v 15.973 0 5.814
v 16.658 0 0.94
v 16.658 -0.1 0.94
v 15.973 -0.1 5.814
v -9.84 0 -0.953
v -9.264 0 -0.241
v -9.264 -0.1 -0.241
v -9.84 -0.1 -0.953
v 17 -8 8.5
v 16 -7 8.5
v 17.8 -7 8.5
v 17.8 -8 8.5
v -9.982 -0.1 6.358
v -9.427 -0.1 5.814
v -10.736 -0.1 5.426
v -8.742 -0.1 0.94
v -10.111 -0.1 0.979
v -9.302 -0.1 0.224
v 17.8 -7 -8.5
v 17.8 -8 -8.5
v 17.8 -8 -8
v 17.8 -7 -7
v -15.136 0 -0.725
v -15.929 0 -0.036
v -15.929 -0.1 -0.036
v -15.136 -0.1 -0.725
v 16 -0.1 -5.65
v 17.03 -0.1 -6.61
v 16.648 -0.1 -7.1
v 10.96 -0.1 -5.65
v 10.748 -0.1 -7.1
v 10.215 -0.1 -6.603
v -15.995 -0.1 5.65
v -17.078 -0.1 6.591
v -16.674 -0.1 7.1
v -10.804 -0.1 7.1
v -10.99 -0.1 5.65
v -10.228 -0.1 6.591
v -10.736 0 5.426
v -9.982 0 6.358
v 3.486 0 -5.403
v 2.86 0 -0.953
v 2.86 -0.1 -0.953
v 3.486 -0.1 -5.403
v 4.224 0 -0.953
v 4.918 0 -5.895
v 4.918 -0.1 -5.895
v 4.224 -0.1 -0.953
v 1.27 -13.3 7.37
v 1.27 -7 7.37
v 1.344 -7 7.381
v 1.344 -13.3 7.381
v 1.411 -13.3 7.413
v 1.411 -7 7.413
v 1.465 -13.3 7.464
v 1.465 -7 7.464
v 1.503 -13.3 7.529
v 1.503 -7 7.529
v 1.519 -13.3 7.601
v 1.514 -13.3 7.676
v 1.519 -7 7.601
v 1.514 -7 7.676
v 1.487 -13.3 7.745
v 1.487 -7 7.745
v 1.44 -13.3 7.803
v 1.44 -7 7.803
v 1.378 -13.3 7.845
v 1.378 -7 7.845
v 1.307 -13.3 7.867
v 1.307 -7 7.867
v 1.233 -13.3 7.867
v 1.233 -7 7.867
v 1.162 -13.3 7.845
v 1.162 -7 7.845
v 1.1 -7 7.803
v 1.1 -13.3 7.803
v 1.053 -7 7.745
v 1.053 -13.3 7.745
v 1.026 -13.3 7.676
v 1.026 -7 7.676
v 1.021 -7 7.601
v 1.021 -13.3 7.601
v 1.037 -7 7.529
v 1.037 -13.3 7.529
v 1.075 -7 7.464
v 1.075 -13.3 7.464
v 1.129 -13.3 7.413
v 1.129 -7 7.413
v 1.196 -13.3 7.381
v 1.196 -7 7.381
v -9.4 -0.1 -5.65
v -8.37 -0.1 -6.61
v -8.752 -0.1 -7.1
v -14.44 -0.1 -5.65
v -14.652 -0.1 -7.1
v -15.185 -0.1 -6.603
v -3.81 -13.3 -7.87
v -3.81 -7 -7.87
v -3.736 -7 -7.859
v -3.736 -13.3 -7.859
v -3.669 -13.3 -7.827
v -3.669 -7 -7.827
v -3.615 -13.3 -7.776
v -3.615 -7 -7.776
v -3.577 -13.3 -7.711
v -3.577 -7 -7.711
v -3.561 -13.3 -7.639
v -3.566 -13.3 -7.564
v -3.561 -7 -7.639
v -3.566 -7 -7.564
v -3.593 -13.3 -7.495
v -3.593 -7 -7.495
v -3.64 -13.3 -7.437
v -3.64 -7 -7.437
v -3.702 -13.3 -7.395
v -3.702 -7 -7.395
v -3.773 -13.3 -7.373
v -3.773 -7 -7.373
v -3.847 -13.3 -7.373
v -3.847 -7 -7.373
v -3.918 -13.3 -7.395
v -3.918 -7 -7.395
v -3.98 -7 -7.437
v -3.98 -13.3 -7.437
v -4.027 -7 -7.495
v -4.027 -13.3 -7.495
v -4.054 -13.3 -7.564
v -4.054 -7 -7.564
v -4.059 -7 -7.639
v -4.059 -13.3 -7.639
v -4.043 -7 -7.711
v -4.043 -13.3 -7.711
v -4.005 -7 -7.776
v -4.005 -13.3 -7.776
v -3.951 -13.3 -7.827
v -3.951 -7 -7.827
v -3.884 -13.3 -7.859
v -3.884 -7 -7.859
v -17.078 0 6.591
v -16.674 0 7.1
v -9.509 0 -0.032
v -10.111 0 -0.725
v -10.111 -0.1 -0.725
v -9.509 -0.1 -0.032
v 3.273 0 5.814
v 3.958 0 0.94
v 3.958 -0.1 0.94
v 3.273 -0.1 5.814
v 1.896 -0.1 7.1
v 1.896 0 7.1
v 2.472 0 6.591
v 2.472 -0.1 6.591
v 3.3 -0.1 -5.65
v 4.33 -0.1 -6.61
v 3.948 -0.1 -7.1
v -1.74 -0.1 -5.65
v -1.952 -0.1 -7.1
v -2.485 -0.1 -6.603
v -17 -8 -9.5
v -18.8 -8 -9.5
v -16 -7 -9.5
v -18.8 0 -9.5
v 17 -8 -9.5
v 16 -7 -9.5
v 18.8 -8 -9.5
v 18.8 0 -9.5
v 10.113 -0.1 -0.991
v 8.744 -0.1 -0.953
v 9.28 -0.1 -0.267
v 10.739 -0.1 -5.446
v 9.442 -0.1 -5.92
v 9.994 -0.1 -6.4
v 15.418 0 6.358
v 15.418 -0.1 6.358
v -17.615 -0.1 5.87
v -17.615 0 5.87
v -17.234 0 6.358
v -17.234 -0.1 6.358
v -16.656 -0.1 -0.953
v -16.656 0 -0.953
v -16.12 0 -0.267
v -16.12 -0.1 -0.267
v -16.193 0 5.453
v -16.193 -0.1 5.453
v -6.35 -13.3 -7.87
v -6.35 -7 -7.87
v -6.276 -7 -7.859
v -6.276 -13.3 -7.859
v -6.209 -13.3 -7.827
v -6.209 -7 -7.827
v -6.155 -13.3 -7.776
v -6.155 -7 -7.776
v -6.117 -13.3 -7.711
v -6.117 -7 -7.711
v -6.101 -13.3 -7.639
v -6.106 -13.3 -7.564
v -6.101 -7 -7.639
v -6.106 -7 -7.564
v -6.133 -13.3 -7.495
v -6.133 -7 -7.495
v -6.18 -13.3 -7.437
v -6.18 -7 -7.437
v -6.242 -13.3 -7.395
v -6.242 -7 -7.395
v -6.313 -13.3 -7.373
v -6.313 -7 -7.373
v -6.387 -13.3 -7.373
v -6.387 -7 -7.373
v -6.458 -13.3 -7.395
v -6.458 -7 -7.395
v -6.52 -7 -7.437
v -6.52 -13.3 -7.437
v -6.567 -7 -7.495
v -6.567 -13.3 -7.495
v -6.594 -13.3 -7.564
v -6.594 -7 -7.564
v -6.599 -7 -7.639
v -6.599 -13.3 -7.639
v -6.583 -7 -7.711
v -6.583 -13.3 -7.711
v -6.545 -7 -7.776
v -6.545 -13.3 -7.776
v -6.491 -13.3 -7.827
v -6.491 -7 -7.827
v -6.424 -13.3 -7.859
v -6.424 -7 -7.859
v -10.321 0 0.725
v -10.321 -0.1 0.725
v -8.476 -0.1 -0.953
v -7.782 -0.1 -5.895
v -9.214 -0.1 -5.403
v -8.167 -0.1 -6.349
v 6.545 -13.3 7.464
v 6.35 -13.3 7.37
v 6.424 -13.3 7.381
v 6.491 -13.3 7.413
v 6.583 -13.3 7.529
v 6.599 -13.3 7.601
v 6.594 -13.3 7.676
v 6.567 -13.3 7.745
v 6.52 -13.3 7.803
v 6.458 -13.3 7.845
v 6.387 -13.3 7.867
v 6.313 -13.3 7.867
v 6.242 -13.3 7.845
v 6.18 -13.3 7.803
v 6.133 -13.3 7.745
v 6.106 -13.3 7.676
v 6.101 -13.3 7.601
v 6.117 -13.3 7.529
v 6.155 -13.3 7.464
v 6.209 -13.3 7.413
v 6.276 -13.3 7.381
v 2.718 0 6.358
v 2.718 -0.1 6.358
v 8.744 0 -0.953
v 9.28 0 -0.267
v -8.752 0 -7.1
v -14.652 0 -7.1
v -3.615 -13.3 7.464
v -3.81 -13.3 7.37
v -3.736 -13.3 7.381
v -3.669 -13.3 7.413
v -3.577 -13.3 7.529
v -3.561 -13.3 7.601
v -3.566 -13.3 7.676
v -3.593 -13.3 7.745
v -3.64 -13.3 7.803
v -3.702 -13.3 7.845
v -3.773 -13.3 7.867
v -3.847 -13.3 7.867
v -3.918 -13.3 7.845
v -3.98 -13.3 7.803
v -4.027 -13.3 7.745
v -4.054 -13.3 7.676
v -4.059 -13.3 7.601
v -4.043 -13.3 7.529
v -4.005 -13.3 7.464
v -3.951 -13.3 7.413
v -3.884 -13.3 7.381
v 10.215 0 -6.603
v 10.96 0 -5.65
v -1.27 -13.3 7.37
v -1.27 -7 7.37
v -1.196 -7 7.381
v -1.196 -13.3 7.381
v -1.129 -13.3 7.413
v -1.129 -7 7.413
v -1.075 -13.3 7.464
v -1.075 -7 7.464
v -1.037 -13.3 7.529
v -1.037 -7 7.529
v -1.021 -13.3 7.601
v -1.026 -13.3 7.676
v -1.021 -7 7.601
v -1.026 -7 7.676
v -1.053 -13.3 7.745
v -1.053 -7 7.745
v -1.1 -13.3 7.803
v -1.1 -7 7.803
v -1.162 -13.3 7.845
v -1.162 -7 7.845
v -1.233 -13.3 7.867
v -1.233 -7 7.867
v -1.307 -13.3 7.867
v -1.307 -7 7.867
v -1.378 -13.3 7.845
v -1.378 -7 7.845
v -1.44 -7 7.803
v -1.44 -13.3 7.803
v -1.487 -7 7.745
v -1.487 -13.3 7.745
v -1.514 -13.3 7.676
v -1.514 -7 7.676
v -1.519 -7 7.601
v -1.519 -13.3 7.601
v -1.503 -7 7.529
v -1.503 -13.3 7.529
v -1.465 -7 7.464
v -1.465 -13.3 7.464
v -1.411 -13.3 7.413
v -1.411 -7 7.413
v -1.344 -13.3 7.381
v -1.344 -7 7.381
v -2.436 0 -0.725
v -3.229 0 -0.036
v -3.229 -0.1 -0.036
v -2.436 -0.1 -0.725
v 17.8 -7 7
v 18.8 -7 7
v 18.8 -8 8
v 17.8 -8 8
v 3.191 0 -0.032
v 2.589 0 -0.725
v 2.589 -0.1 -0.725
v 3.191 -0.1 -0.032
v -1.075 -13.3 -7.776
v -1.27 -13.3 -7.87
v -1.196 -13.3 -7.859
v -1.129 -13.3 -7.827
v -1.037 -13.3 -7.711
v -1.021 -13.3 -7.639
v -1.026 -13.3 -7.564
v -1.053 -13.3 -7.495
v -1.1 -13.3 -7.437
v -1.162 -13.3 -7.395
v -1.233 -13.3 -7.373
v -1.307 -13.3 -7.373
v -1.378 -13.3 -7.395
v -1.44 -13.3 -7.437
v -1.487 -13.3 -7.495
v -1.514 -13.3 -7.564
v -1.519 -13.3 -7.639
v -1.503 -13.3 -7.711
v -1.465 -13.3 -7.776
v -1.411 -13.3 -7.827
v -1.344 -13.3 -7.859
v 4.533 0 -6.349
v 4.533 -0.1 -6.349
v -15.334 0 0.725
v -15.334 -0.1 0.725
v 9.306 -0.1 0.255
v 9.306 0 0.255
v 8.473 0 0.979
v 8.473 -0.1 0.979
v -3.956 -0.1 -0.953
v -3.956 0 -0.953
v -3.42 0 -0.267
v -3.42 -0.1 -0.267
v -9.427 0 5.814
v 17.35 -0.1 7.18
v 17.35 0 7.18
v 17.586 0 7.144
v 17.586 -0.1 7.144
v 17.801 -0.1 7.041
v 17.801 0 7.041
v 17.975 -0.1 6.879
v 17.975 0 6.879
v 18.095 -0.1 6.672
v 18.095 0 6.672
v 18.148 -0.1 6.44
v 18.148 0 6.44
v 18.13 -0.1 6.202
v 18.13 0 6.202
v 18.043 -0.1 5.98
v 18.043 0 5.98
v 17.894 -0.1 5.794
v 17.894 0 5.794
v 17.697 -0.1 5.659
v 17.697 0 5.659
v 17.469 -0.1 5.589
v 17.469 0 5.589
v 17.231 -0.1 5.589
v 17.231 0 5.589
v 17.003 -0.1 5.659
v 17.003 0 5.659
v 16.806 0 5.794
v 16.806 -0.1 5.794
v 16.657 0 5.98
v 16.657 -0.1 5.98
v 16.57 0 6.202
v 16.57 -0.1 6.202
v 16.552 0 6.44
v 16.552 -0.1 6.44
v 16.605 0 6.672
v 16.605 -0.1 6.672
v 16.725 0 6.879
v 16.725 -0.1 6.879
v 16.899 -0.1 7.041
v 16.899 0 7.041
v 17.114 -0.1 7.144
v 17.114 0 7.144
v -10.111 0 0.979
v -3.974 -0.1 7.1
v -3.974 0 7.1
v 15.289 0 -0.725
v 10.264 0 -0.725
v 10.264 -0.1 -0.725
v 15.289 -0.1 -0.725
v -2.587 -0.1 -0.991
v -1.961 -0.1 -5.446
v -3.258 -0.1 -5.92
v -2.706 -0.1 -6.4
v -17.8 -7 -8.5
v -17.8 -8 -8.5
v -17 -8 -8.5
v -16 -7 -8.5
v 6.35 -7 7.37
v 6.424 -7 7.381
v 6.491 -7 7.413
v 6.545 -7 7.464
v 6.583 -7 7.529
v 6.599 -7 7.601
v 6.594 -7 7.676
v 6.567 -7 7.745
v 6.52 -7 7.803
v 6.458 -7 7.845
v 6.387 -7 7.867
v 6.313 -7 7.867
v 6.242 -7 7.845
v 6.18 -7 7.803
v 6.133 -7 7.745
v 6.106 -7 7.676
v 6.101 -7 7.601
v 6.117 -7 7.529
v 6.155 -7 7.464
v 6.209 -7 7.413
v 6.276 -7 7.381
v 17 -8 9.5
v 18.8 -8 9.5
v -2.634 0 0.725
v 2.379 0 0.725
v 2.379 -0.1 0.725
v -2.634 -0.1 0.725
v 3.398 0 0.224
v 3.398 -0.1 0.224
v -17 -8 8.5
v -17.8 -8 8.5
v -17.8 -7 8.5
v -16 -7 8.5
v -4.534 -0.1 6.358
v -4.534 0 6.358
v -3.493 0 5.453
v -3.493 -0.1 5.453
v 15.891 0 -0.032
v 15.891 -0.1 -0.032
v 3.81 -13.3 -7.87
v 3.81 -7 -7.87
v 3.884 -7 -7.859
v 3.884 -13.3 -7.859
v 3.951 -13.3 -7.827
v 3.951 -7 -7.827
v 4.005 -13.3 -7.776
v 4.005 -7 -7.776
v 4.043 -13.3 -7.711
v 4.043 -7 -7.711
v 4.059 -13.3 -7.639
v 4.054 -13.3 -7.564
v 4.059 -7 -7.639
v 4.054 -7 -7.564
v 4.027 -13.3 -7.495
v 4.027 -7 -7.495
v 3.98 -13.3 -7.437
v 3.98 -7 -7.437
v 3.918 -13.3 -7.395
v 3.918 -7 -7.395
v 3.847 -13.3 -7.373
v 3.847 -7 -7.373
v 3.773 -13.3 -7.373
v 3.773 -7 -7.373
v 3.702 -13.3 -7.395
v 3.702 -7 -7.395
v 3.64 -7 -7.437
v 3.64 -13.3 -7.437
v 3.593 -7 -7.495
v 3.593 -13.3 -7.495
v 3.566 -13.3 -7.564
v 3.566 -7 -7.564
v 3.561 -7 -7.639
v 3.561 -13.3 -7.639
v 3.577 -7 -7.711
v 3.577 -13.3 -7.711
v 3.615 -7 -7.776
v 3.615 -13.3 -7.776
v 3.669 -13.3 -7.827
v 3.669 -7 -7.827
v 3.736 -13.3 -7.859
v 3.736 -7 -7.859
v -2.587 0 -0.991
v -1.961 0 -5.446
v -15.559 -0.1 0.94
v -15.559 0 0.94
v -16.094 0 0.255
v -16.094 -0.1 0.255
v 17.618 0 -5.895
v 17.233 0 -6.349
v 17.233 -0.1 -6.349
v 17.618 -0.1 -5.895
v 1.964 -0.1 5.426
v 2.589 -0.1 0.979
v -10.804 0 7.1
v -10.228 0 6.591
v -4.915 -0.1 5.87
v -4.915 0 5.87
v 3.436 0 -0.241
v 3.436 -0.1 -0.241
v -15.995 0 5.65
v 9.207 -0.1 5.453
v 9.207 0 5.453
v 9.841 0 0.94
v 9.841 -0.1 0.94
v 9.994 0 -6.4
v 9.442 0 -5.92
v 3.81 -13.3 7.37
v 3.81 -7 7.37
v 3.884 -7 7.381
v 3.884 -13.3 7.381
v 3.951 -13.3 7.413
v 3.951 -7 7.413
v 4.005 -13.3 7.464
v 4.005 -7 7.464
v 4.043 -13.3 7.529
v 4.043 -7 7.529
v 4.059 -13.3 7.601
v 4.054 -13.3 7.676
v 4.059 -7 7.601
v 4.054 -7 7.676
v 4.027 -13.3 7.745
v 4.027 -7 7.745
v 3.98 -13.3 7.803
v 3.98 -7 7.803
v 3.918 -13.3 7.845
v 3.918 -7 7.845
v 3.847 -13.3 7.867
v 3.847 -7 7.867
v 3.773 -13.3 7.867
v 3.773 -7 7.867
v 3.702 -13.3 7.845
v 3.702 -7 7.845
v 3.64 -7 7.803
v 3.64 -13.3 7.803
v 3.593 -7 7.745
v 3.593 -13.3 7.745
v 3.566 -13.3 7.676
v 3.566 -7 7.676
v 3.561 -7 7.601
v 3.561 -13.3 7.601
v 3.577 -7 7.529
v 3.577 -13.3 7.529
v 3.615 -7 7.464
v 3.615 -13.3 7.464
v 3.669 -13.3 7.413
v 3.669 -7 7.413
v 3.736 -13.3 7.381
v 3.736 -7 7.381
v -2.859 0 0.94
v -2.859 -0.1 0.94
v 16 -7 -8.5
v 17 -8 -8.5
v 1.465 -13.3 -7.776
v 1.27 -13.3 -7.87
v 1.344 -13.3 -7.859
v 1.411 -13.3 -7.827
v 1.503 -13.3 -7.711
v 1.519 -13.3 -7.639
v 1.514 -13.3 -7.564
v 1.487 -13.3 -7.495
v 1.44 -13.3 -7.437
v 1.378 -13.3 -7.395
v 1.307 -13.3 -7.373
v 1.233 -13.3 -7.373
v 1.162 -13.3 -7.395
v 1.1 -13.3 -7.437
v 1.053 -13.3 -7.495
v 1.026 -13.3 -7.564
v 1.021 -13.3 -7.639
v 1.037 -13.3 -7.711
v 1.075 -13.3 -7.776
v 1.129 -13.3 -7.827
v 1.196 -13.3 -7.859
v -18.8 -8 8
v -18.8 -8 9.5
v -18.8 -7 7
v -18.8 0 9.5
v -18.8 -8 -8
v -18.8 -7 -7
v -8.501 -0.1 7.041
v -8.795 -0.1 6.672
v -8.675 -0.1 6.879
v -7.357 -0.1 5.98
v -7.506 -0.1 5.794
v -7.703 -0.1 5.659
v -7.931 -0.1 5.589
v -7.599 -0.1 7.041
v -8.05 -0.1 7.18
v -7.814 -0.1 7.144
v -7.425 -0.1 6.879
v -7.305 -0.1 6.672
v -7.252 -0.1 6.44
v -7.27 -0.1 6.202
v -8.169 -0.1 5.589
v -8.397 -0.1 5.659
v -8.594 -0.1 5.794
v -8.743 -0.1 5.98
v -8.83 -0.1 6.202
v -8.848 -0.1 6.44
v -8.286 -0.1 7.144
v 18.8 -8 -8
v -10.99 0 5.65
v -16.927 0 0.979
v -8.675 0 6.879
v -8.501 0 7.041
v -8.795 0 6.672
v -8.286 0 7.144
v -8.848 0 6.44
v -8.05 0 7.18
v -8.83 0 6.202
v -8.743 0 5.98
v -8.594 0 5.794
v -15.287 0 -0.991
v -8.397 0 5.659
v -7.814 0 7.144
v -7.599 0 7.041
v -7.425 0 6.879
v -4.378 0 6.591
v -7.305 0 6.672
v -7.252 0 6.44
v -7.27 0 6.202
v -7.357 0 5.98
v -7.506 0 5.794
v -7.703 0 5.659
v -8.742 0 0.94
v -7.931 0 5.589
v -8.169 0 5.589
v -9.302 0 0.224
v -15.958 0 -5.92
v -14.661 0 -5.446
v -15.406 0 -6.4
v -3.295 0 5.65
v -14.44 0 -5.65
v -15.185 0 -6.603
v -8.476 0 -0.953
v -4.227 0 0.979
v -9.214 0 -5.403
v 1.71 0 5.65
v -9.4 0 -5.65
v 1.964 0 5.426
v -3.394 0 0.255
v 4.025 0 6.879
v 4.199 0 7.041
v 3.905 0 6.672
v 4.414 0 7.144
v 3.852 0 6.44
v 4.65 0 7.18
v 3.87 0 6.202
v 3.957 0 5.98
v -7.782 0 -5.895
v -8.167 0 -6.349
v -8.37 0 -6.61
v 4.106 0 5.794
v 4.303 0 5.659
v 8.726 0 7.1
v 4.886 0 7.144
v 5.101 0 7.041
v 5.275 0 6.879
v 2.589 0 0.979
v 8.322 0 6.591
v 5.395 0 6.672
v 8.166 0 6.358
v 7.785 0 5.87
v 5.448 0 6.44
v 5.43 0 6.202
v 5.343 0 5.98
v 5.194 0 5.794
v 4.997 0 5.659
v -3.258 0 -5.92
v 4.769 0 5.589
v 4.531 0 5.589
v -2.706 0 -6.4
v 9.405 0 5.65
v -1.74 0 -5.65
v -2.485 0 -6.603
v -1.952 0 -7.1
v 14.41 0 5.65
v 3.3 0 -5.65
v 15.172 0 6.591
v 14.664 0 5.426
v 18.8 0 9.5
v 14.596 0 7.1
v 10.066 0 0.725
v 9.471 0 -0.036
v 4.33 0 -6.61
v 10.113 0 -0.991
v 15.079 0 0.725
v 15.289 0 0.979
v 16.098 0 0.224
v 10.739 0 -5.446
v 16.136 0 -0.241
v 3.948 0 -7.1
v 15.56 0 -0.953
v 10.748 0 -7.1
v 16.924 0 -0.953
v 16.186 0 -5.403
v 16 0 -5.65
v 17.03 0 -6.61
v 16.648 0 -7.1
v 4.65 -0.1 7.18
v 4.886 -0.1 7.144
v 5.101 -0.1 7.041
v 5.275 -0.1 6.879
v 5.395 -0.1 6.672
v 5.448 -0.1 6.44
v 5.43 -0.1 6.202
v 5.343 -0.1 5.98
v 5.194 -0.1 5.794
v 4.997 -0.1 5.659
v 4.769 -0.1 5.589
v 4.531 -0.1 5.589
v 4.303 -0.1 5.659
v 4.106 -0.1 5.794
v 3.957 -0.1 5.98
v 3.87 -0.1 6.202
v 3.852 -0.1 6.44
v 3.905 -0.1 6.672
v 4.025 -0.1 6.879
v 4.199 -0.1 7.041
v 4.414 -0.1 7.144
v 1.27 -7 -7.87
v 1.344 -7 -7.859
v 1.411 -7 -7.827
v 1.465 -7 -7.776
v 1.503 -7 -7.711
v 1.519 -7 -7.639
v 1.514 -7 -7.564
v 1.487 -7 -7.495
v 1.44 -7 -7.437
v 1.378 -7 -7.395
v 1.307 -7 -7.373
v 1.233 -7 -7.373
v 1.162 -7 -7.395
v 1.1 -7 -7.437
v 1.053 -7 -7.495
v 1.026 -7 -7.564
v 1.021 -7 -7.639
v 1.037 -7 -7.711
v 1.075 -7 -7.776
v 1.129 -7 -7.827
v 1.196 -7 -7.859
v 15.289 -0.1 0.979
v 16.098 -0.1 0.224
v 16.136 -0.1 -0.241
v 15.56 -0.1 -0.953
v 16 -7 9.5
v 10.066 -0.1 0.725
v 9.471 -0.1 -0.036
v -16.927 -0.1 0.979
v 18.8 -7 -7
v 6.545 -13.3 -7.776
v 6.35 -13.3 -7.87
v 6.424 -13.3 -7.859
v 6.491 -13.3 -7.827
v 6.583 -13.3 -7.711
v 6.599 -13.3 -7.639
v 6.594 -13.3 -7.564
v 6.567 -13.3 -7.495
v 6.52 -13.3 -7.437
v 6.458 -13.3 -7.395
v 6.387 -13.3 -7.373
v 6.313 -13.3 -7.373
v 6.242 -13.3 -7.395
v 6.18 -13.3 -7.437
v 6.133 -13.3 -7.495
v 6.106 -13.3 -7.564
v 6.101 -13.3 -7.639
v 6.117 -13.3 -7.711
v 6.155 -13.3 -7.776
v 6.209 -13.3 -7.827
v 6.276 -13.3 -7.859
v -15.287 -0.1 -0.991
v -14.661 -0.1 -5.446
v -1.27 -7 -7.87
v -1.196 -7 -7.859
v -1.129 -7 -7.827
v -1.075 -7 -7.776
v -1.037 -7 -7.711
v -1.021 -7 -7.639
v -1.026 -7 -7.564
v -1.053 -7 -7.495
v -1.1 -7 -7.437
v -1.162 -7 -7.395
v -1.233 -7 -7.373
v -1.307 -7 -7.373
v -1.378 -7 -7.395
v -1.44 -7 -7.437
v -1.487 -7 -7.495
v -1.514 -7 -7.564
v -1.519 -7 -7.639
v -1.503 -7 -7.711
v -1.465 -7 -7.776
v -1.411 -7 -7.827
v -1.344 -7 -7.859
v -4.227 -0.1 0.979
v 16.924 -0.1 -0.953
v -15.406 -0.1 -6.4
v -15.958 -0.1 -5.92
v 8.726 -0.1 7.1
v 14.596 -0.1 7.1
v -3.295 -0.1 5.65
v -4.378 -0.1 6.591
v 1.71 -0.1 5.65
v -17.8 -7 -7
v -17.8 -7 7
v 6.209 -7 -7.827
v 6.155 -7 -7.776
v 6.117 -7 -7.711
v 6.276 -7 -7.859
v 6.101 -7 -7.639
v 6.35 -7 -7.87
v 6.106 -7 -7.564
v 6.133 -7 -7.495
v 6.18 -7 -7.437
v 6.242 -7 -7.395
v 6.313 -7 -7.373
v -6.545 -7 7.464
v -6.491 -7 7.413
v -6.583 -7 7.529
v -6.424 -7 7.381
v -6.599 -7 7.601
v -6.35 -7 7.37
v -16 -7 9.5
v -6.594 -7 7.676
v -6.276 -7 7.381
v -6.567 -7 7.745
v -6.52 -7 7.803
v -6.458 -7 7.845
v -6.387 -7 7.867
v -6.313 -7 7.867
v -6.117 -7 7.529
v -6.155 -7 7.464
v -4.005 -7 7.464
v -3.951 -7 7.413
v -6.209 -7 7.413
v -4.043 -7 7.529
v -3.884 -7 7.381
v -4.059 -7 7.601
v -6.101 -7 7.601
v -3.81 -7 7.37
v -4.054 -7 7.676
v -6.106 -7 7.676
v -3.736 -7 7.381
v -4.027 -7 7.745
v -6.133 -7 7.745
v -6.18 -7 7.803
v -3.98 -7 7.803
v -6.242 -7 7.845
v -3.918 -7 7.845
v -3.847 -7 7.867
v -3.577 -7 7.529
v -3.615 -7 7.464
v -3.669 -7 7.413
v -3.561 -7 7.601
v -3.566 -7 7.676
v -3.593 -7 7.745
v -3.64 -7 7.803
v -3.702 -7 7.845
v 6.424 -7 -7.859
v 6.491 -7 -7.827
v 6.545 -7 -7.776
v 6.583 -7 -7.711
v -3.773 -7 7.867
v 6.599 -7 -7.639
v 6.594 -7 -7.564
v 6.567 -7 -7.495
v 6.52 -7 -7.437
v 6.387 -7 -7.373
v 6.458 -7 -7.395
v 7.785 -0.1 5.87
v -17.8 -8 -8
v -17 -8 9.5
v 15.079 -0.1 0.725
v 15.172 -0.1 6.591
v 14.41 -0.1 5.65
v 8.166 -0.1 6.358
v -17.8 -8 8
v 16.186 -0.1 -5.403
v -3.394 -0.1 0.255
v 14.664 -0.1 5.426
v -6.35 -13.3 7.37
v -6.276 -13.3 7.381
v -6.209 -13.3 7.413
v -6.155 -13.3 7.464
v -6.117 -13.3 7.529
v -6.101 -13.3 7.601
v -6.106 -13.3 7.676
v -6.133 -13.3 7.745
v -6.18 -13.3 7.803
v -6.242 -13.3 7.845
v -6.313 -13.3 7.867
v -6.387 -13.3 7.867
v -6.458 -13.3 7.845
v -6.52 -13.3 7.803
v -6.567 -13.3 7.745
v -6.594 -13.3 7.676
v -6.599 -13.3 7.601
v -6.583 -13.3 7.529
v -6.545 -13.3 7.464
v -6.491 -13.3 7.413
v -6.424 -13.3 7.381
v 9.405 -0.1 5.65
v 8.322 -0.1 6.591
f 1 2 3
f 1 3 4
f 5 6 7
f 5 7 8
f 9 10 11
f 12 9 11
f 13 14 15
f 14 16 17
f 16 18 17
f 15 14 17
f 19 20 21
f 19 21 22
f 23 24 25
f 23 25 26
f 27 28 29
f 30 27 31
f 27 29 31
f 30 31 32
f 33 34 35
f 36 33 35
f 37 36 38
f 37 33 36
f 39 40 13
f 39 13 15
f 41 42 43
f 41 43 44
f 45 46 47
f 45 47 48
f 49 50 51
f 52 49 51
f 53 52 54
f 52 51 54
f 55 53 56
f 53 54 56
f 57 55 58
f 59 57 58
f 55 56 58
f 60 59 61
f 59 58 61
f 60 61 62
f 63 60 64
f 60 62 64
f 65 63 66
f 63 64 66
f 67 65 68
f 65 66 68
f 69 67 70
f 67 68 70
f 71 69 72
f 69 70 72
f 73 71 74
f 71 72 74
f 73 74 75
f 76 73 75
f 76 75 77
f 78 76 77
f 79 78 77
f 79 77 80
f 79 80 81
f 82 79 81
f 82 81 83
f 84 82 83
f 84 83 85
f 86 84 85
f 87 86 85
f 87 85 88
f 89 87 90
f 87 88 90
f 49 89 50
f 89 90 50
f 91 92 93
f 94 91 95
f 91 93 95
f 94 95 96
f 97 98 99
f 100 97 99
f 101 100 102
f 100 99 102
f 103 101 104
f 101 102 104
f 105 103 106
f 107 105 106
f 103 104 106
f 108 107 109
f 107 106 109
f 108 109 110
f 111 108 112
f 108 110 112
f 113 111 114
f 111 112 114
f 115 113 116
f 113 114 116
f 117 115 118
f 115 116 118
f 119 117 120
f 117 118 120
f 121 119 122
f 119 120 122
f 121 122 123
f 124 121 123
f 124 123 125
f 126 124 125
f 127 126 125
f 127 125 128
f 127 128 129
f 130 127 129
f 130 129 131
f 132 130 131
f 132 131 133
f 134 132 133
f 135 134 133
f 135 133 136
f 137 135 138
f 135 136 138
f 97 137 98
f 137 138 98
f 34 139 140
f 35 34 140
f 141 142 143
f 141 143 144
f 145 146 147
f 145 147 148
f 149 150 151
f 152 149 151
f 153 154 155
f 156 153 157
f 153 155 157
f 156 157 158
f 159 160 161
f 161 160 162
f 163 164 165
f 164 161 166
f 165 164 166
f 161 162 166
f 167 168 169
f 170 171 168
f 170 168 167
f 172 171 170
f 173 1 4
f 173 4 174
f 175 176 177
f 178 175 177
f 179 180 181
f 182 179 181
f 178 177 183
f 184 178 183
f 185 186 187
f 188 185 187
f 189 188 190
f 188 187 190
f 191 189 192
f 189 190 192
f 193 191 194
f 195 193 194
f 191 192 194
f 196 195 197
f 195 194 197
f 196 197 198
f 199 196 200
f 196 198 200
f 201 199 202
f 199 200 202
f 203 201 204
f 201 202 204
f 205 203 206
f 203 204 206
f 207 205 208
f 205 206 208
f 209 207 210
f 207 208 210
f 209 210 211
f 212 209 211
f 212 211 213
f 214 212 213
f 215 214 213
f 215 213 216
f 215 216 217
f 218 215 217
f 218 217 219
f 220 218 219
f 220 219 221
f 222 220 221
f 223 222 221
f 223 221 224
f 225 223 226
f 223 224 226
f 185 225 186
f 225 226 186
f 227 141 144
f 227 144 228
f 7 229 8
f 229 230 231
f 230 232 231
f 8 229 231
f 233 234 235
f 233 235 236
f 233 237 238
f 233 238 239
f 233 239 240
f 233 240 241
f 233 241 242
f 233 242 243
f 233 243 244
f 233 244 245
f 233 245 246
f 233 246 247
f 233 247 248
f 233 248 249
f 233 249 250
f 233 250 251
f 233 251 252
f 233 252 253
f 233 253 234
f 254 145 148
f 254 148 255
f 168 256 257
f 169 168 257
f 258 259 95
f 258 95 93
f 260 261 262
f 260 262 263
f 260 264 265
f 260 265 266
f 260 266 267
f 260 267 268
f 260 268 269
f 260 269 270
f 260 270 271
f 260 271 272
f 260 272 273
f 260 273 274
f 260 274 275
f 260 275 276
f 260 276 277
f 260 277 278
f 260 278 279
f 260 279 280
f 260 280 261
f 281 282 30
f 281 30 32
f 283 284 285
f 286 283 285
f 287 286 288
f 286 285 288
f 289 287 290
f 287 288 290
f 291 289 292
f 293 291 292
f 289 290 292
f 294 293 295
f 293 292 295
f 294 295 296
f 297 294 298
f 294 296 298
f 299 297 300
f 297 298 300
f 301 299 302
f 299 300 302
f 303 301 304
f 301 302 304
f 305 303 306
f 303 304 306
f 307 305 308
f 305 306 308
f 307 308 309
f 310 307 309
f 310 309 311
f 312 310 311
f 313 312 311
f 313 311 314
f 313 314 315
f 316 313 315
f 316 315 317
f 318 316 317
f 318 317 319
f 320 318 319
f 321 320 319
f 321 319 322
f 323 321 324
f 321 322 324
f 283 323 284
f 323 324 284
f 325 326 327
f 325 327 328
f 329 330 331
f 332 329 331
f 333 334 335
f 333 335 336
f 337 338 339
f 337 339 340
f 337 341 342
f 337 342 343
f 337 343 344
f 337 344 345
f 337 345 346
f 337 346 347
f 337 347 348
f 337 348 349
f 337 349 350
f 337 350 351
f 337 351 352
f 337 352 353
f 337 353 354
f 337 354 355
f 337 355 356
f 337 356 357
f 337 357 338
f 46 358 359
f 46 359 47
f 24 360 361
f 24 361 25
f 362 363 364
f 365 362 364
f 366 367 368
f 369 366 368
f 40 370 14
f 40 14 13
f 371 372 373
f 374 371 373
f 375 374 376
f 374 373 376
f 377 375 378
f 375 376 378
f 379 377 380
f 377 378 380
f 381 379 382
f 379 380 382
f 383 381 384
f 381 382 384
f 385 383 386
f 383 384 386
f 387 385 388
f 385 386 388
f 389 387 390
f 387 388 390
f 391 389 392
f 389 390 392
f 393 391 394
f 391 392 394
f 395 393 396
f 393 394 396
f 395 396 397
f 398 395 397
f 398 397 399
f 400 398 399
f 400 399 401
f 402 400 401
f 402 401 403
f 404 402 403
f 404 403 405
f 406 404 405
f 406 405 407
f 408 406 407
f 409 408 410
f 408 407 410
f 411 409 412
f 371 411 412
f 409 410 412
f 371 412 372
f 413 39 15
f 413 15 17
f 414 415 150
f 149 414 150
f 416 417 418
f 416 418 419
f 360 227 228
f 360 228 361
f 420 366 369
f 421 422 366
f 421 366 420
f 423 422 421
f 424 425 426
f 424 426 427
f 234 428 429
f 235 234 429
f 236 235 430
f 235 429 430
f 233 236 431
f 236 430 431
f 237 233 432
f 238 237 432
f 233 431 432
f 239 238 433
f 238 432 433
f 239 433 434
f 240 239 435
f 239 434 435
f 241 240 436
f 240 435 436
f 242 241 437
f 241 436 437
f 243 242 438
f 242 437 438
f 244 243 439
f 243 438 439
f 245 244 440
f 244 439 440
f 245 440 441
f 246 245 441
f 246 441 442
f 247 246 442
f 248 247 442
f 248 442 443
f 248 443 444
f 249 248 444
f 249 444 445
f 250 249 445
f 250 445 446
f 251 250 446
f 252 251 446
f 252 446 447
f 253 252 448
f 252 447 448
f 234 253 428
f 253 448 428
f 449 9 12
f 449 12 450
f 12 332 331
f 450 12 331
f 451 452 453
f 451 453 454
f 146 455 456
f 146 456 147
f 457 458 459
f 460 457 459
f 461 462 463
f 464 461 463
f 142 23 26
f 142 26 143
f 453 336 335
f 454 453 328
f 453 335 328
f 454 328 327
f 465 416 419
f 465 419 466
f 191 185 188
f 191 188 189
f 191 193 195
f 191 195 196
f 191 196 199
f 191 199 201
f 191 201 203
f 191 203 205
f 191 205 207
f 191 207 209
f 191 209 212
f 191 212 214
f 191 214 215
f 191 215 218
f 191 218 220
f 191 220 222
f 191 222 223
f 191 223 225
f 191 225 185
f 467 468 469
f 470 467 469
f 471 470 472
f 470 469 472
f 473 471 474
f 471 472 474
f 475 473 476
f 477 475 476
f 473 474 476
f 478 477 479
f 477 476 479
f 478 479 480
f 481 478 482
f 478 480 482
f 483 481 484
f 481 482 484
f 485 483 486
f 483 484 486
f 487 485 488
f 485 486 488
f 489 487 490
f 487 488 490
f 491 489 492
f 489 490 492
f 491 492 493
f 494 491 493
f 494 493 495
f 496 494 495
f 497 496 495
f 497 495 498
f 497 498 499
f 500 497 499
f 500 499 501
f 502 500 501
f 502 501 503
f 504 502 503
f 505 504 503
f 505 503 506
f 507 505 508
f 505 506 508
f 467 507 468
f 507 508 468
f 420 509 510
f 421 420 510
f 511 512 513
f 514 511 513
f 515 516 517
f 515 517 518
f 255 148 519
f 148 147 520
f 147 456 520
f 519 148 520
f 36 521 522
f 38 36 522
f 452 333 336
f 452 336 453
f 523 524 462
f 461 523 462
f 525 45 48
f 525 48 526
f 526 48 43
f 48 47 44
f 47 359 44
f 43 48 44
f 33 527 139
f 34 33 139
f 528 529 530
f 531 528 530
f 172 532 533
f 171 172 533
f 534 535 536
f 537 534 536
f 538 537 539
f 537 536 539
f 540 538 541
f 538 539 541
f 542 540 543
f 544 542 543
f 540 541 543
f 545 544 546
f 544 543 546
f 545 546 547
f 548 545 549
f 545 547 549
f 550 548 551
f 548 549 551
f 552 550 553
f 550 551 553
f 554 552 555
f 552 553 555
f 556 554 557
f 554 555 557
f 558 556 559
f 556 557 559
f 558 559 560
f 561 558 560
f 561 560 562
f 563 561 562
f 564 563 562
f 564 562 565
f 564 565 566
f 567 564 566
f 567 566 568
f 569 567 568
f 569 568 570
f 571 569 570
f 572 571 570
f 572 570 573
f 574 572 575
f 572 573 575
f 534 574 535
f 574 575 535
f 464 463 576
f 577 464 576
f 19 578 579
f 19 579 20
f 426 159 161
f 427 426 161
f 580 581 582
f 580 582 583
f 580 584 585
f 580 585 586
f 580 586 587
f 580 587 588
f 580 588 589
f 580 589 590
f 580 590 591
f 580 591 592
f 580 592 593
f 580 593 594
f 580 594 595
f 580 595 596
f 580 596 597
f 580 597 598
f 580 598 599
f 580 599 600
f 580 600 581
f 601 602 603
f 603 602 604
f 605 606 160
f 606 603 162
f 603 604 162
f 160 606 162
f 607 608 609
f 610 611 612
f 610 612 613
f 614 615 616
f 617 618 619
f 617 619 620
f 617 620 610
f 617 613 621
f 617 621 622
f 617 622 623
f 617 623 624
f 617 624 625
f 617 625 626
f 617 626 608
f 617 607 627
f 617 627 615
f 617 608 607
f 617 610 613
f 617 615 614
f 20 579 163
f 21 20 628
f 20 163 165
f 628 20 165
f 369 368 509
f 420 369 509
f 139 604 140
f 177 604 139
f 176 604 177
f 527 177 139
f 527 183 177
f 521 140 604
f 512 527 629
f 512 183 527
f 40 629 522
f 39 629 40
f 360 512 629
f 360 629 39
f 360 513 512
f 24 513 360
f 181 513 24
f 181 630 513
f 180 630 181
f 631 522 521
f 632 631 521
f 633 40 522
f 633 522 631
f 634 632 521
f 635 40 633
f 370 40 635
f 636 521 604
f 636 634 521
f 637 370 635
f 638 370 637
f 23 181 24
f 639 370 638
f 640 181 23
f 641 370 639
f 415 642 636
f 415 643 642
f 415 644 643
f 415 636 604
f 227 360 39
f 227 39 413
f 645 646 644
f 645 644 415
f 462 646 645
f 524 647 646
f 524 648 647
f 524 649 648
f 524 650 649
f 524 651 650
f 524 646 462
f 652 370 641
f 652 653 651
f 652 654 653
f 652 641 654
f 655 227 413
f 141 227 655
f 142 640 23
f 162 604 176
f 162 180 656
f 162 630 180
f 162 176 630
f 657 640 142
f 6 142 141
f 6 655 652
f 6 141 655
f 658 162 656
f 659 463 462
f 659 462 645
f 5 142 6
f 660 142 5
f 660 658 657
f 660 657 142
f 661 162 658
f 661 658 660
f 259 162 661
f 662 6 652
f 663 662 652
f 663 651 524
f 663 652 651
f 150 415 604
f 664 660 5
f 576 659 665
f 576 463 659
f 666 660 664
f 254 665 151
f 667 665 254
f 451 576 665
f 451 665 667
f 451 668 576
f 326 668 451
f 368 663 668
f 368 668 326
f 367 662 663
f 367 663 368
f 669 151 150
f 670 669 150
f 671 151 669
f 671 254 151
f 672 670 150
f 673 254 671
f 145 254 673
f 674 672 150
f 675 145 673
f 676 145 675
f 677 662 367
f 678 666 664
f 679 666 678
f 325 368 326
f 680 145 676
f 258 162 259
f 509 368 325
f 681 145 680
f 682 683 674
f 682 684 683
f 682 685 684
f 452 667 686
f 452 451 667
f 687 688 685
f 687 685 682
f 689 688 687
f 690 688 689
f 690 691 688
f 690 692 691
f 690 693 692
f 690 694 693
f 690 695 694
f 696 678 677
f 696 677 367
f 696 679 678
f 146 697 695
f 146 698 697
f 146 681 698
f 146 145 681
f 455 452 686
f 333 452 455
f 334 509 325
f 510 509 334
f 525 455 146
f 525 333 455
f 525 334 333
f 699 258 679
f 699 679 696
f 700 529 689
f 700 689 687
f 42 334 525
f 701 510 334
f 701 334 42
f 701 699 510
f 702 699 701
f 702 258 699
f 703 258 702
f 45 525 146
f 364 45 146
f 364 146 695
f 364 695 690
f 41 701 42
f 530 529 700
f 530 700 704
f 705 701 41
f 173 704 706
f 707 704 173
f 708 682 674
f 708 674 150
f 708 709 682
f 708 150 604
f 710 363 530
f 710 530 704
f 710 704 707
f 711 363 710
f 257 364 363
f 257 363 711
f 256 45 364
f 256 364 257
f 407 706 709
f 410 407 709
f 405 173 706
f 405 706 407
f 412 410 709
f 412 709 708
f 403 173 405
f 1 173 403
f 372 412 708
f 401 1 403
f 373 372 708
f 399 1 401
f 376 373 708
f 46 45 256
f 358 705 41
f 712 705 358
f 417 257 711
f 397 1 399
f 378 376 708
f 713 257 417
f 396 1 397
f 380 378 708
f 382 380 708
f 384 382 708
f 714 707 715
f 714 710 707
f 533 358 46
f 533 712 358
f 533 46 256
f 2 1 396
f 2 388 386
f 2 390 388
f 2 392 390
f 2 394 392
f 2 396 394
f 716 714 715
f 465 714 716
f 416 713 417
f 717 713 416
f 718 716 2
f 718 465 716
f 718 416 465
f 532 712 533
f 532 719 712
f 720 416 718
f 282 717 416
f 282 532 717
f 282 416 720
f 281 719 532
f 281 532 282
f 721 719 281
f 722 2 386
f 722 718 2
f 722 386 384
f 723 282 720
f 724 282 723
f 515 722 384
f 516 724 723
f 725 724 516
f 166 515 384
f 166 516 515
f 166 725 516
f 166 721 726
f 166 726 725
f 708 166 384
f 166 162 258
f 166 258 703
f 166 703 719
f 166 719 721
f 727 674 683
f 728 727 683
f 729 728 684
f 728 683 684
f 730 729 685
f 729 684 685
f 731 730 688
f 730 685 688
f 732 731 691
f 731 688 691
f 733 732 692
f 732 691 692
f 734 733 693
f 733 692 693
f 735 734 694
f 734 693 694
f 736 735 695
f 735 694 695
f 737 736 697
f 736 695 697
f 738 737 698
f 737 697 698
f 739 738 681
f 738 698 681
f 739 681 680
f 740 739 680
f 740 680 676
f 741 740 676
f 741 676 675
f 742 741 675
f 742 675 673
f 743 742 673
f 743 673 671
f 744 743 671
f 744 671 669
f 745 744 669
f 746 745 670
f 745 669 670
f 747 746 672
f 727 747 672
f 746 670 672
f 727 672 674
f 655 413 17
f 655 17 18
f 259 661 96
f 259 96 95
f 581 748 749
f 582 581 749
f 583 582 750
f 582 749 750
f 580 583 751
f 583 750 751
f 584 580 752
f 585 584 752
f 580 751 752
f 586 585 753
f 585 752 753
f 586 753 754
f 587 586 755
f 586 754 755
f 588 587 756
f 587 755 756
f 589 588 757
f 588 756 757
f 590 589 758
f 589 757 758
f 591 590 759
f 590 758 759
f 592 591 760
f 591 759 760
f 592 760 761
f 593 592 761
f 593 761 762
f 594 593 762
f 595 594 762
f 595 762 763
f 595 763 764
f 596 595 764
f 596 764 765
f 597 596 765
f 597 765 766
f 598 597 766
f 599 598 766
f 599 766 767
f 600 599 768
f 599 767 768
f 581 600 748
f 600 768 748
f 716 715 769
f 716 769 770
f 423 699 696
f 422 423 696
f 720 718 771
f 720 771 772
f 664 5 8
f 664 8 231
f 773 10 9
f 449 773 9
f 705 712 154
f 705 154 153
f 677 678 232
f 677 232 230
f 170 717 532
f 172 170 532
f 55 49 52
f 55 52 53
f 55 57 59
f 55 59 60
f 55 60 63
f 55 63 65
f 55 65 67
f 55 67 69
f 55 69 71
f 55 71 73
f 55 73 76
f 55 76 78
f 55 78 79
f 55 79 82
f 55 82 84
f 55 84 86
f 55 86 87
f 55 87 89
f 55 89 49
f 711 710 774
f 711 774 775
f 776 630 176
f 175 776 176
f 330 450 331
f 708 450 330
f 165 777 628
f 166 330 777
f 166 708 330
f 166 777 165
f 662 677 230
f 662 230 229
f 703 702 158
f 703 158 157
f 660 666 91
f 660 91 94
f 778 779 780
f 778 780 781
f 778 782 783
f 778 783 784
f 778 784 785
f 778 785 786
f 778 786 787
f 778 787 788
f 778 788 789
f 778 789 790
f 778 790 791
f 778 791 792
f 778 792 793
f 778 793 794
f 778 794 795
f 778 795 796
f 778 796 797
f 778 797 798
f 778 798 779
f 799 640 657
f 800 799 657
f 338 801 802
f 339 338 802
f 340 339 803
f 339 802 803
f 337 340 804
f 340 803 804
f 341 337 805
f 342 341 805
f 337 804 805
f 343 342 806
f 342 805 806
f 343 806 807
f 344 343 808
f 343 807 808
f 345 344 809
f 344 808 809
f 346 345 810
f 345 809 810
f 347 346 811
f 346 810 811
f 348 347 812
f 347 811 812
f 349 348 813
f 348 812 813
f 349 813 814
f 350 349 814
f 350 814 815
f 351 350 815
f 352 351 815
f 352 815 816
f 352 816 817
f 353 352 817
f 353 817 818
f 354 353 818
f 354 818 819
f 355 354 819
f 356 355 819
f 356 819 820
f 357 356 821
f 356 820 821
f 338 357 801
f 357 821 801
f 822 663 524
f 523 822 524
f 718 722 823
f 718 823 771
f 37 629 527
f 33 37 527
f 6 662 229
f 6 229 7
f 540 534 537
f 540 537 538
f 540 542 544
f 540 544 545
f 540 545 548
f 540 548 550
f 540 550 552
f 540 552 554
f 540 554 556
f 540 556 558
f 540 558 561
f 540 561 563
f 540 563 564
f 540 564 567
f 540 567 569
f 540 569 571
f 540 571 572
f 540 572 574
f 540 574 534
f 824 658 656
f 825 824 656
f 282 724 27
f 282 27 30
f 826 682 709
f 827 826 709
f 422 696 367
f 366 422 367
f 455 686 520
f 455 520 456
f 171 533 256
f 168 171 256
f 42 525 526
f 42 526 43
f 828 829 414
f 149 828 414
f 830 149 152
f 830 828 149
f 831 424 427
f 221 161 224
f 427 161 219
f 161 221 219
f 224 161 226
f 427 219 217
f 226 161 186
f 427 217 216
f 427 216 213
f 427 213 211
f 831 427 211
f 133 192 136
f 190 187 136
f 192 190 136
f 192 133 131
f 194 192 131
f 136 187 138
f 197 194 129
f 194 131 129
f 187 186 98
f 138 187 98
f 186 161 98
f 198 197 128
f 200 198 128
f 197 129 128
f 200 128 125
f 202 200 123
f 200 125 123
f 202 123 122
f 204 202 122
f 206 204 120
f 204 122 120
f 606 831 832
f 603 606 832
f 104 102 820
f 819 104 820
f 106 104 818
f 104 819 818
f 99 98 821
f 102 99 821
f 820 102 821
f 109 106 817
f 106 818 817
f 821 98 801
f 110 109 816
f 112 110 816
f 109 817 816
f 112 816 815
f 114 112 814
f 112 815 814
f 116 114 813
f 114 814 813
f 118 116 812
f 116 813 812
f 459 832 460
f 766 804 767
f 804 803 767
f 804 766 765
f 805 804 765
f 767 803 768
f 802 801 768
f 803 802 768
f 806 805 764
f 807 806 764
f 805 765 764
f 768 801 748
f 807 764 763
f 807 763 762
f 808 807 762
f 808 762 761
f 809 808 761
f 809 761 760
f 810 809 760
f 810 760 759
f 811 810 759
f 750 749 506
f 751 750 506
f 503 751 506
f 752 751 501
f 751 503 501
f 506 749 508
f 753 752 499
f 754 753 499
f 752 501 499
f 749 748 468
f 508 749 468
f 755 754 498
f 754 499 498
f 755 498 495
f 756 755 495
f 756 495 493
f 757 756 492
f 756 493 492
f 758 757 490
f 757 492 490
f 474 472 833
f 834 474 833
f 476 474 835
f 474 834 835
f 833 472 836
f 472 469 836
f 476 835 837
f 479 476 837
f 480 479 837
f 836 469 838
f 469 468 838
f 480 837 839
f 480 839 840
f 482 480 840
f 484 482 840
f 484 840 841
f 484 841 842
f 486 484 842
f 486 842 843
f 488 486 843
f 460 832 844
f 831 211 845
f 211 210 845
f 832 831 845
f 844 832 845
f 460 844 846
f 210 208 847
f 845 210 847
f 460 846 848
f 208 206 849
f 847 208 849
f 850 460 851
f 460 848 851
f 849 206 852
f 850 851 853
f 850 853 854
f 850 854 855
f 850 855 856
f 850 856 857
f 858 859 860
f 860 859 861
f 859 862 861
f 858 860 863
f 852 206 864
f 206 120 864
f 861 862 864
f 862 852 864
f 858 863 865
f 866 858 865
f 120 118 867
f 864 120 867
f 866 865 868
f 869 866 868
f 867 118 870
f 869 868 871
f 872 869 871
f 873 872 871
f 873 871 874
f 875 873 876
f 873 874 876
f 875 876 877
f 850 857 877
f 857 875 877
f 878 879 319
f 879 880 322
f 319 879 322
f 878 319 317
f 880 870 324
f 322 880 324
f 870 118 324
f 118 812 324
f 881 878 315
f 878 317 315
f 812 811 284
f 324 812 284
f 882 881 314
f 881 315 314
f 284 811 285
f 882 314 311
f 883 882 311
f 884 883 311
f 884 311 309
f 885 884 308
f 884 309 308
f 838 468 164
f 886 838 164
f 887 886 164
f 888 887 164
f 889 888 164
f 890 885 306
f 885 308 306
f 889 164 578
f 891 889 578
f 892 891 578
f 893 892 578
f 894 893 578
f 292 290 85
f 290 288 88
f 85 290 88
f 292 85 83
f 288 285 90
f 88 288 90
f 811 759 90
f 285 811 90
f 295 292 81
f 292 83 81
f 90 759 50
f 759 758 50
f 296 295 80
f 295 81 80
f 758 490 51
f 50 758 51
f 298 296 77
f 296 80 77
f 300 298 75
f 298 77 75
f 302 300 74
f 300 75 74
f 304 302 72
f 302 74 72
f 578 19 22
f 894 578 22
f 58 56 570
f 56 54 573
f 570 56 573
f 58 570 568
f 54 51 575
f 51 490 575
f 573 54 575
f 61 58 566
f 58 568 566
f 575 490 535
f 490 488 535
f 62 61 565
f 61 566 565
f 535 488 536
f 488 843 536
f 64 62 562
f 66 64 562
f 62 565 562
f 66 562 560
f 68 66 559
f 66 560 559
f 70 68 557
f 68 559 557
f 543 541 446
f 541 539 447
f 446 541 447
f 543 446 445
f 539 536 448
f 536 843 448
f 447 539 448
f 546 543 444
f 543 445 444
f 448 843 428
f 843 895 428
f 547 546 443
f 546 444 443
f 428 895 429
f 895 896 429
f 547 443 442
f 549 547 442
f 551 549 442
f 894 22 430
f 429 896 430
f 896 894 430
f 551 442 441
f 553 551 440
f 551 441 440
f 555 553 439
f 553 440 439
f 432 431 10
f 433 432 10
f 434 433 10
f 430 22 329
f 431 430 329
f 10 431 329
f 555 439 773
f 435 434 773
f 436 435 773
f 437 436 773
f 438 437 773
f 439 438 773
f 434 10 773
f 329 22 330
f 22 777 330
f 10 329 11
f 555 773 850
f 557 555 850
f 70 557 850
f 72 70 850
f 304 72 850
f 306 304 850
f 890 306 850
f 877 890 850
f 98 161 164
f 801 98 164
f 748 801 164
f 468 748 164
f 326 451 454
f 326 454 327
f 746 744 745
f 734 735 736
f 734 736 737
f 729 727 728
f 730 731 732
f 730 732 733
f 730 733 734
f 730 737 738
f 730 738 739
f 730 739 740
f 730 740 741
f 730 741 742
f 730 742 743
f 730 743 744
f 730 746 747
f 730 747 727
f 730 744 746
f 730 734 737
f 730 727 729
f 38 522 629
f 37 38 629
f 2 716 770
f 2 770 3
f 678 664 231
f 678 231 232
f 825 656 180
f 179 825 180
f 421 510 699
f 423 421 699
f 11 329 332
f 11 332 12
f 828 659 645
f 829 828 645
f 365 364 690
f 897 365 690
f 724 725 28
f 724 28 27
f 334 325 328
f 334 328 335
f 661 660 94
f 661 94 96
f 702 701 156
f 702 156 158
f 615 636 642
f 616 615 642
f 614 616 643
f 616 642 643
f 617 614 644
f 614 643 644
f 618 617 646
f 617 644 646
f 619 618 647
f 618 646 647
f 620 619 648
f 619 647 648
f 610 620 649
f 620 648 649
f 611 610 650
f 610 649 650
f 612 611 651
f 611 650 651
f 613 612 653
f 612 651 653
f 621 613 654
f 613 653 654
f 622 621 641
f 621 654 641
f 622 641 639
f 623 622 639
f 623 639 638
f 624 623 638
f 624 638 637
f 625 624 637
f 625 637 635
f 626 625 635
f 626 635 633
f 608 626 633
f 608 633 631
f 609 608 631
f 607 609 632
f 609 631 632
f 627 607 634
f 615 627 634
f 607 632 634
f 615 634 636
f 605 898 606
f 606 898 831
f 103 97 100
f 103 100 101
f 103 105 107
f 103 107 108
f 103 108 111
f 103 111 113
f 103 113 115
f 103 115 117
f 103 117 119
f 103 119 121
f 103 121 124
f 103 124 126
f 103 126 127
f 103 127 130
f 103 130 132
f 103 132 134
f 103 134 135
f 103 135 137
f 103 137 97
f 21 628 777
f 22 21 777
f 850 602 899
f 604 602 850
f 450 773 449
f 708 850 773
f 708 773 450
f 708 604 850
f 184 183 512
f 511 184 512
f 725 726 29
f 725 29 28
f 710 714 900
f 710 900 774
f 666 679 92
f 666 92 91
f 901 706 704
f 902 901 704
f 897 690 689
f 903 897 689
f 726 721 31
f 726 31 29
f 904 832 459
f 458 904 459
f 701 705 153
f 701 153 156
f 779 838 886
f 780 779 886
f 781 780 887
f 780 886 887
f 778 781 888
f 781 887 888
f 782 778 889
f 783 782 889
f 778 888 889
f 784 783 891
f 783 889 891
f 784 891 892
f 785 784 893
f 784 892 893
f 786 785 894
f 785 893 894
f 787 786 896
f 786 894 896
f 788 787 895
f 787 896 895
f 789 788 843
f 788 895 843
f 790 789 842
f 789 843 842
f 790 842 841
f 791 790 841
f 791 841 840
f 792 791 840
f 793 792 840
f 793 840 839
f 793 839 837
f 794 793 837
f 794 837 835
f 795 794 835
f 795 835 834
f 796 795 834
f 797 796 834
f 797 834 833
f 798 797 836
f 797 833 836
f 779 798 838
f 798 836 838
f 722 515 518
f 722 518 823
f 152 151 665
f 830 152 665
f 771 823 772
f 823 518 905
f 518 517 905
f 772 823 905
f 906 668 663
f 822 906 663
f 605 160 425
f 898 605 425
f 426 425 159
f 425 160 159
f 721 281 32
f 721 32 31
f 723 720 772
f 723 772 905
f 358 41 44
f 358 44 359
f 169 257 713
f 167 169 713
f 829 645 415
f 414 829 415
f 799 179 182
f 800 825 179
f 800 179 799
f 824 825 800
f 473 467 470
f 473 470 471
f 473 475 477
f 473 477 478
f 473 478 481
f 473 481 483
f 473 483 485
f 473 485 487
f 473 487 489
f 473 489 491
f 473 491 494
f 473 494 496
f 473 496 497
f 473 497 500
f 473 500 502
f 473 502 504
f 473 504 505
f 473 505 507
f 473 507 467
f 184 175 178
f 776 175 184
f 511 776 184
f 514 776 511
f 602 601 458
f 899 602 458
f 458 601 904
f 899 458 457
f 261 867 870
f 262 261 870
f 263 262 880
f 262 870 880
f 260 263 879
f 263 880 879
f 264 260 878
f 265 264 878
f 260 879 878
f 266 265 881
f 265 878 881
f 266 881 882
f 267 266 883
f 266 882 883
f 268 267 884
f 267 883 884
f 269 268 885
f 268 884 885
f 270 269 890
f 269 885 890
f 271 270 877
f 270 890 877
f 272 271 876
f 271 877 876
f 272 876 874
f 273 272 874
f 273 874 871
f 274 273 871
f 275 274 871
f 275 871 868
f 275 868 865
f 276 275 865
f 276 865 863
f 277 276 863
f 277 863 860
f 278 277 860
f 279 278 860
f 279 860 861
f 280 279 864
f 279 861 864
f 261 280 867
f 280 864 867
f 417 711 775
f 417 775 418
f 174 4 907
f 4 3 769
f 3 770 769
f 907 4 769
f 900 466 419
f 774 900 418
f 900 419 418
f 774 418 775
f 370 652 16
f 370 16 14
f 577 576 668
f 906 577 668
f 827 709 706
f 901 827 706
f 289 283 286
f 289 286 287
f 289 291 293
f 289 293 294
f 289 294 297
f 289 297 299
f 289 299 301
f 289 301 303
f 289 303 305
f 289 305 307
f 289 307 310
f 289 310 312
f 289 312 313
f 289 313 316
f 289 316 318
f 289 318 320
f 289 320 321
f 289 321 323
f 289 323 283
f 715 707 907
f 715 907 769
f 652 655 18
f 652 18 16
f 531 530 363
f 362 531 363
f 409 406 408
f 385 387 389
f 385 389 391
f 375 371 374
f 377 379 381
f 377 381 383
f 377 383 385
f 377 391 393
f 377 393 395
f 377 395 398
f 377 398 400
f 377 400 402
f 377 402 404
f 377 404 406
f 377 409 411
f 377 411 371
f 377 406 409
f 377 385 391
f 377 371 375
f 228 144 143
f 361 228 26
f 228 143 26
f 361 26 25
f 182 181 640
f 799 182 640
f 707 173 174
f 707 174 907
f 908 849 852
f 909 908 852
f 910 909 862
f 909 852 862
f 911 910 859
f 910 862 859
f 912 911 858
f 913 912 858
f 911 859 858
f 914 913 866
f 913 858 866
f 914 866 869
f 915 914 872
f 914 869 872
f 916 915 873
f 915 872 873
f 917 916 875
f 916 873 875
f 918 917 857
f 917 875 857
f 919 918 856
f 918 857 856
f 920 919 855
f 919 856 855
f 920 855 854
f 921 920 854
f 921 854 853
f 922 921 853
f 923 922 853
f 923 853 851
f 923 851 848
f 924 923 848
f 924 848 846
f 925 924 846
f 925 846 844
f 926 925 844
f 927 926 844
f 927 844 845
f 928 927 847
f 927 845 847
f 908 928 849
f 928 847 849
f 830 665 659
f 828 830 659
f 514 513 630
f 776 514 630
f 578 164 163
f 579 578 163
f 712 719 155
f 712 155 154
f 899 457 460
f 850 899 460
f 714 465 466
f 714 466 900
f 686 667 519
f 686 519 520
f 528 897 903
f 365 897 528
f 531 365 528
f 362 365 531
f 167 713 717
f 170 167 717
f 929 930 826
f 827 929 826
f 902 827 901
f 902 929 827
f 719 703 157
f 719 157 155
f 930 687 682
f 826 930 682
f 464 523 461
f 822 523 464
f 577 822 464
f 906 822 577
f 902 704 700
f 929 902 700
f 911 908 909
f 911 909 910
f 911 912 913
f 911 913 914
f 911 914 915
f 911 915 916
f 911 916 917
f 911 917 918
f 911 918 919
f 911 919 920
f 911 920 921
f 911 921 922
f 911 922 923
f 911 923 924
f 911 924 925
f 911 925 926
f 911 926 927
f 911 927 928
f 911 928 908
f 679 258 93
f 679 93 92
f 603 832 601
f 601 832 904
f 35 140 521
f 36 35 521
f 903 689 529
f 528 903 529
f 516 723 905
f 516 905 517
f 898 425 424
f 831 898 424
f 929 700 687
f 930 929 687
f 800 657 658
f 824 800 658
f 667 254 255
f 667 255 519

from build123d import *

# Parameters (mm, degrees)
SKETCH1_W           = 37.6
SKETCH1_H           = 19
BOSS_EXTRUDE1_DEPTH = 8
SKETCH2_R           = 0.8
CUT_EXTRUDE2_DEPTH  = 0.1
LPATTERN1_COUNT     = 2
LPATTERN1_PITCH     = 12.7
LPATTERN1_COL_COUNT = 2
LPATTERN1_COL_PITCH = 12.7
SKETCH3_W           = 35.6
SKETCH3_H           = 17
CUT_EXTRUDE3_DEPTH  = 1
CUT_EXTRUDE4_REACH  = 29.901
CUT_EXTRUDE5_REACH  = 41.598
SKETCH6_R           = 0.25
BOSS_EXTRUDE2_DEPTH = 6.3


with BuildPart() as part:
    # Sketch1 → Boss-Extrude1 (new body)
    with BuildSketch(Plane(origin=(0, 0, 0), x_dir=(1, 0, 0), z_dir=(0, 1, 0))):
        Rectangle(SKETCH1_W, SKETCH1_H)
    extrude(amount=-BOSS_EXTRUDE1_DEPTH)

    # Sketch2 → Cut-Extrude2 (cut)
    with BuildSketch(Plane(origin=(0, 0, 0), x_dir=(1, 0, 0), z_dir=(0, 1, 0))):
        with Locations(Location((4.65, -6.38, 0), (0, 0, 270))):
            Circle(SKETCH2_R)
        Polygon((-1.952160074, 7.1), (3.947839926, 7.1), (4.330286309, 6.610490952), (3.300285866, 5.65), (-1.739648247, 5.65), (-2.484598632, 6.603493012), align=None)
        Polygon((-3.974480793, -7.1), (1.896221961, -7.1), (2.47230822, -6.591070163), (1.710455735, -5.65), (-3.295309805, -5.65), (-4.377887189, -6.591070163), align=None)
        Polygon((-2.436227615, 0.725), (2.588908996, 0.725), (3.190979416, 0.03239721), (2.378770347, -0.725), (-2.634272031, -0.725), (-3.228830819, 0.036000546), align=None)
        Polygon((-3.257787721, 5.920086849), (-3.95590304, 0.952738247), (-3.420237283, 0.267117343), (-2.587224094, 0.991244661), (-1.961121981, 5.446192679), (-2.706072366, 6.399685691), align=None)
        Polygon((4.918287738, 5.894984695), (4.223764825, 0.953197385), (3.436295545, 0.241486663), (2.860442223, 0.952803342), (3.485903792, 5.403193652), (4.532747216, 6.349325404), align=None)
        Polygon((-4.227399341, -0.979058314), (-4.914771822, -5.869967647), (-4.533510098, -6.3579604), (-3.492963653, -5.453427176), (-2.858633029, -0.939930263), (-3.394044886, -0.254634337), align=None)
        Polygon((3.9576888, -0.940031907), (3.272664385, -5.814233886), (2.718039978, -6.3579604), (1.96390108, -5.426418363), (2.588908996, -0.979255956), (3.398498757, -0.224301291), align=None)
    cut_extrude2 = extrude(amount=-CUT_EXTRUDE2_DEPTH, mode=Mode.SUBTRACT)

    # LPattern1: Cut-Extrude2 ×2
    with Locations(*[(-i * LPATTERN1_PITCH, 0, 0) for i in range(1, LPATTERN1_COUNT)]):
        add(cut_extrude2, mode=Mode.SUBTRACT)

    # LPattern1 col: Cut-Extrude2 ×2
    with Locations(*[(i * LPATTERN1_COL_PITCH, 0, 0) for i in range(1, LPATTERN1_COL_COUNT)]):
        add(cut_extrude2, mode=Mode.SUBTRACT)

    # Sketch3 → Cut-Extrude3 (cut)
    with BuildSketch(Plane.XZ.offset(8)):
        Rectangle(SKETCH3_W, SKETCH3_H)
    extrude(amount=-CUT_EXTRUDE3_DEPTH, mode=Mode.SUBTRACT)

    # Cut-Extrude4: up to this face of the body (flat: up to its plane)
    cut_extrude4_end = Plane(part.part.faces().sort_by_distance((0, -4, 9.5))[0])
    # Sketch4 → Cut-Extrude4 (cut, up to the picked face)
    with BuildSketch(Plane(origin=(0, 0, -9.5), x_dir=(-1, 0, 0), z_dir=(0, 0, -1)), mode=Mode.PRIVATE) as cut_extrude4_sk1:
        Polygon((-17, -8), (17, -8), (16, -7), (-16, -7), align=None)
    cut_extrude4_tool1 = split(extrude(cut_extrude4_sk1.sketch, amount=-CUT_EXTRUDE4_REACH, mode=Mode.PRIVATE), bisect_by=cut_extrude4_end, keep=Keep.BOTH, mode=Mode.PRIVATE)
    add(cut_extrude4_tool1.solids().sort_by(Axis((0, -7.505051, -9.5), (0, 0, 1)))[0], mode=Mode.SUBTRACT)

    # Cut-Extrude5: up to this face of the body (flat: up to its plane)
    cut_extrude5_end = Plane(part.part.faces().sort_by_distance((-18.8, -4, 0))[0])
    # Sketch5 → Cut-Extrude5 (cut, up to the picked face)
    with BuildSketch(Plane(origin=(18.8, 0, 0), x_dir=(0, 0, -1), z_dir=(1, 0, 0)), mode=Mode.PRIVATE) as cut_extrude5_sk1:
        Polygon((-8, -8), (8, -8), (7, -7), (-7, -7), align=None)
    cut_extrude5_tool1 = split(extrude(cut_extrude5_sk1.sketch, amount=-CUT_EXTRUDE5_REACH, mode=Mode.PRIVATE), bisect_by=cut_extrude5_end, keep=Keep.BOTH, mode=Mode.PRIVATE)
    add(cut_extrude5_tool1.solids().sort_by(Axis((18.8, -7.511111, 0), (-1, 0, 0)))[0], mode=Mode.SUBTRACT)

    # Sketch6 → Boss-Extrude2 (add)
    with BuildSketch(Plane.XZ.offset(7)):
        with Locations(Location((-6.35, -7.62, 0), (0, 0, 270))):
            Circle(SKETCH6_R)
        with Locations(Location((-3.81, -7.62, 0), (0, 0, 270))):
            Circle(SKETCH6_R)
        with Locations(Location((-1.27, -7.62, 0), (0, 0, 270))):
            Circle(SKETCH6_R)
        with Locations(Location((1.27, -7.62, 0), (0, 0, 270))):
            Circle(SKETCH6_R)
        with Locations(Location((3.81, -7.62, 0), (0, 0, 270))):
            Circle(SKETCH6_R)
        with Locations(Location((6.35, -7.62, 0), (0, 0, 270))):
            Circle(SKETCH6_R)
        with Locations(Location((-3.81, 7.62, 0), (0, 0, 270))):
            Circle(SKETCH6_R)
        with Locations(Location((-1.27, 7.62, 0), (0, 0, 270))):
            Circle(SKETCH6_R)
        with Locations(Location((1.27, 7.62, 0), (0, 0, 270))):
            Circle(SKETCH6_R)
        with Locations(Location((3.81, 7.62, 0), (0, 0, 270))):
            Circle(SKETCH6_R)
        with Locations(Location((6.35, 7.62, 0), (0, 0, 270))):
            Circle(SKETCH6_R)
        with Locations(Location((-6.35, 7.62, 0), (0, 0, 270))):
            Circle(SKETCH6_R)
    extrude(amount=BOSS_EXTRUDE2_DEPTH)


solid = part.part
